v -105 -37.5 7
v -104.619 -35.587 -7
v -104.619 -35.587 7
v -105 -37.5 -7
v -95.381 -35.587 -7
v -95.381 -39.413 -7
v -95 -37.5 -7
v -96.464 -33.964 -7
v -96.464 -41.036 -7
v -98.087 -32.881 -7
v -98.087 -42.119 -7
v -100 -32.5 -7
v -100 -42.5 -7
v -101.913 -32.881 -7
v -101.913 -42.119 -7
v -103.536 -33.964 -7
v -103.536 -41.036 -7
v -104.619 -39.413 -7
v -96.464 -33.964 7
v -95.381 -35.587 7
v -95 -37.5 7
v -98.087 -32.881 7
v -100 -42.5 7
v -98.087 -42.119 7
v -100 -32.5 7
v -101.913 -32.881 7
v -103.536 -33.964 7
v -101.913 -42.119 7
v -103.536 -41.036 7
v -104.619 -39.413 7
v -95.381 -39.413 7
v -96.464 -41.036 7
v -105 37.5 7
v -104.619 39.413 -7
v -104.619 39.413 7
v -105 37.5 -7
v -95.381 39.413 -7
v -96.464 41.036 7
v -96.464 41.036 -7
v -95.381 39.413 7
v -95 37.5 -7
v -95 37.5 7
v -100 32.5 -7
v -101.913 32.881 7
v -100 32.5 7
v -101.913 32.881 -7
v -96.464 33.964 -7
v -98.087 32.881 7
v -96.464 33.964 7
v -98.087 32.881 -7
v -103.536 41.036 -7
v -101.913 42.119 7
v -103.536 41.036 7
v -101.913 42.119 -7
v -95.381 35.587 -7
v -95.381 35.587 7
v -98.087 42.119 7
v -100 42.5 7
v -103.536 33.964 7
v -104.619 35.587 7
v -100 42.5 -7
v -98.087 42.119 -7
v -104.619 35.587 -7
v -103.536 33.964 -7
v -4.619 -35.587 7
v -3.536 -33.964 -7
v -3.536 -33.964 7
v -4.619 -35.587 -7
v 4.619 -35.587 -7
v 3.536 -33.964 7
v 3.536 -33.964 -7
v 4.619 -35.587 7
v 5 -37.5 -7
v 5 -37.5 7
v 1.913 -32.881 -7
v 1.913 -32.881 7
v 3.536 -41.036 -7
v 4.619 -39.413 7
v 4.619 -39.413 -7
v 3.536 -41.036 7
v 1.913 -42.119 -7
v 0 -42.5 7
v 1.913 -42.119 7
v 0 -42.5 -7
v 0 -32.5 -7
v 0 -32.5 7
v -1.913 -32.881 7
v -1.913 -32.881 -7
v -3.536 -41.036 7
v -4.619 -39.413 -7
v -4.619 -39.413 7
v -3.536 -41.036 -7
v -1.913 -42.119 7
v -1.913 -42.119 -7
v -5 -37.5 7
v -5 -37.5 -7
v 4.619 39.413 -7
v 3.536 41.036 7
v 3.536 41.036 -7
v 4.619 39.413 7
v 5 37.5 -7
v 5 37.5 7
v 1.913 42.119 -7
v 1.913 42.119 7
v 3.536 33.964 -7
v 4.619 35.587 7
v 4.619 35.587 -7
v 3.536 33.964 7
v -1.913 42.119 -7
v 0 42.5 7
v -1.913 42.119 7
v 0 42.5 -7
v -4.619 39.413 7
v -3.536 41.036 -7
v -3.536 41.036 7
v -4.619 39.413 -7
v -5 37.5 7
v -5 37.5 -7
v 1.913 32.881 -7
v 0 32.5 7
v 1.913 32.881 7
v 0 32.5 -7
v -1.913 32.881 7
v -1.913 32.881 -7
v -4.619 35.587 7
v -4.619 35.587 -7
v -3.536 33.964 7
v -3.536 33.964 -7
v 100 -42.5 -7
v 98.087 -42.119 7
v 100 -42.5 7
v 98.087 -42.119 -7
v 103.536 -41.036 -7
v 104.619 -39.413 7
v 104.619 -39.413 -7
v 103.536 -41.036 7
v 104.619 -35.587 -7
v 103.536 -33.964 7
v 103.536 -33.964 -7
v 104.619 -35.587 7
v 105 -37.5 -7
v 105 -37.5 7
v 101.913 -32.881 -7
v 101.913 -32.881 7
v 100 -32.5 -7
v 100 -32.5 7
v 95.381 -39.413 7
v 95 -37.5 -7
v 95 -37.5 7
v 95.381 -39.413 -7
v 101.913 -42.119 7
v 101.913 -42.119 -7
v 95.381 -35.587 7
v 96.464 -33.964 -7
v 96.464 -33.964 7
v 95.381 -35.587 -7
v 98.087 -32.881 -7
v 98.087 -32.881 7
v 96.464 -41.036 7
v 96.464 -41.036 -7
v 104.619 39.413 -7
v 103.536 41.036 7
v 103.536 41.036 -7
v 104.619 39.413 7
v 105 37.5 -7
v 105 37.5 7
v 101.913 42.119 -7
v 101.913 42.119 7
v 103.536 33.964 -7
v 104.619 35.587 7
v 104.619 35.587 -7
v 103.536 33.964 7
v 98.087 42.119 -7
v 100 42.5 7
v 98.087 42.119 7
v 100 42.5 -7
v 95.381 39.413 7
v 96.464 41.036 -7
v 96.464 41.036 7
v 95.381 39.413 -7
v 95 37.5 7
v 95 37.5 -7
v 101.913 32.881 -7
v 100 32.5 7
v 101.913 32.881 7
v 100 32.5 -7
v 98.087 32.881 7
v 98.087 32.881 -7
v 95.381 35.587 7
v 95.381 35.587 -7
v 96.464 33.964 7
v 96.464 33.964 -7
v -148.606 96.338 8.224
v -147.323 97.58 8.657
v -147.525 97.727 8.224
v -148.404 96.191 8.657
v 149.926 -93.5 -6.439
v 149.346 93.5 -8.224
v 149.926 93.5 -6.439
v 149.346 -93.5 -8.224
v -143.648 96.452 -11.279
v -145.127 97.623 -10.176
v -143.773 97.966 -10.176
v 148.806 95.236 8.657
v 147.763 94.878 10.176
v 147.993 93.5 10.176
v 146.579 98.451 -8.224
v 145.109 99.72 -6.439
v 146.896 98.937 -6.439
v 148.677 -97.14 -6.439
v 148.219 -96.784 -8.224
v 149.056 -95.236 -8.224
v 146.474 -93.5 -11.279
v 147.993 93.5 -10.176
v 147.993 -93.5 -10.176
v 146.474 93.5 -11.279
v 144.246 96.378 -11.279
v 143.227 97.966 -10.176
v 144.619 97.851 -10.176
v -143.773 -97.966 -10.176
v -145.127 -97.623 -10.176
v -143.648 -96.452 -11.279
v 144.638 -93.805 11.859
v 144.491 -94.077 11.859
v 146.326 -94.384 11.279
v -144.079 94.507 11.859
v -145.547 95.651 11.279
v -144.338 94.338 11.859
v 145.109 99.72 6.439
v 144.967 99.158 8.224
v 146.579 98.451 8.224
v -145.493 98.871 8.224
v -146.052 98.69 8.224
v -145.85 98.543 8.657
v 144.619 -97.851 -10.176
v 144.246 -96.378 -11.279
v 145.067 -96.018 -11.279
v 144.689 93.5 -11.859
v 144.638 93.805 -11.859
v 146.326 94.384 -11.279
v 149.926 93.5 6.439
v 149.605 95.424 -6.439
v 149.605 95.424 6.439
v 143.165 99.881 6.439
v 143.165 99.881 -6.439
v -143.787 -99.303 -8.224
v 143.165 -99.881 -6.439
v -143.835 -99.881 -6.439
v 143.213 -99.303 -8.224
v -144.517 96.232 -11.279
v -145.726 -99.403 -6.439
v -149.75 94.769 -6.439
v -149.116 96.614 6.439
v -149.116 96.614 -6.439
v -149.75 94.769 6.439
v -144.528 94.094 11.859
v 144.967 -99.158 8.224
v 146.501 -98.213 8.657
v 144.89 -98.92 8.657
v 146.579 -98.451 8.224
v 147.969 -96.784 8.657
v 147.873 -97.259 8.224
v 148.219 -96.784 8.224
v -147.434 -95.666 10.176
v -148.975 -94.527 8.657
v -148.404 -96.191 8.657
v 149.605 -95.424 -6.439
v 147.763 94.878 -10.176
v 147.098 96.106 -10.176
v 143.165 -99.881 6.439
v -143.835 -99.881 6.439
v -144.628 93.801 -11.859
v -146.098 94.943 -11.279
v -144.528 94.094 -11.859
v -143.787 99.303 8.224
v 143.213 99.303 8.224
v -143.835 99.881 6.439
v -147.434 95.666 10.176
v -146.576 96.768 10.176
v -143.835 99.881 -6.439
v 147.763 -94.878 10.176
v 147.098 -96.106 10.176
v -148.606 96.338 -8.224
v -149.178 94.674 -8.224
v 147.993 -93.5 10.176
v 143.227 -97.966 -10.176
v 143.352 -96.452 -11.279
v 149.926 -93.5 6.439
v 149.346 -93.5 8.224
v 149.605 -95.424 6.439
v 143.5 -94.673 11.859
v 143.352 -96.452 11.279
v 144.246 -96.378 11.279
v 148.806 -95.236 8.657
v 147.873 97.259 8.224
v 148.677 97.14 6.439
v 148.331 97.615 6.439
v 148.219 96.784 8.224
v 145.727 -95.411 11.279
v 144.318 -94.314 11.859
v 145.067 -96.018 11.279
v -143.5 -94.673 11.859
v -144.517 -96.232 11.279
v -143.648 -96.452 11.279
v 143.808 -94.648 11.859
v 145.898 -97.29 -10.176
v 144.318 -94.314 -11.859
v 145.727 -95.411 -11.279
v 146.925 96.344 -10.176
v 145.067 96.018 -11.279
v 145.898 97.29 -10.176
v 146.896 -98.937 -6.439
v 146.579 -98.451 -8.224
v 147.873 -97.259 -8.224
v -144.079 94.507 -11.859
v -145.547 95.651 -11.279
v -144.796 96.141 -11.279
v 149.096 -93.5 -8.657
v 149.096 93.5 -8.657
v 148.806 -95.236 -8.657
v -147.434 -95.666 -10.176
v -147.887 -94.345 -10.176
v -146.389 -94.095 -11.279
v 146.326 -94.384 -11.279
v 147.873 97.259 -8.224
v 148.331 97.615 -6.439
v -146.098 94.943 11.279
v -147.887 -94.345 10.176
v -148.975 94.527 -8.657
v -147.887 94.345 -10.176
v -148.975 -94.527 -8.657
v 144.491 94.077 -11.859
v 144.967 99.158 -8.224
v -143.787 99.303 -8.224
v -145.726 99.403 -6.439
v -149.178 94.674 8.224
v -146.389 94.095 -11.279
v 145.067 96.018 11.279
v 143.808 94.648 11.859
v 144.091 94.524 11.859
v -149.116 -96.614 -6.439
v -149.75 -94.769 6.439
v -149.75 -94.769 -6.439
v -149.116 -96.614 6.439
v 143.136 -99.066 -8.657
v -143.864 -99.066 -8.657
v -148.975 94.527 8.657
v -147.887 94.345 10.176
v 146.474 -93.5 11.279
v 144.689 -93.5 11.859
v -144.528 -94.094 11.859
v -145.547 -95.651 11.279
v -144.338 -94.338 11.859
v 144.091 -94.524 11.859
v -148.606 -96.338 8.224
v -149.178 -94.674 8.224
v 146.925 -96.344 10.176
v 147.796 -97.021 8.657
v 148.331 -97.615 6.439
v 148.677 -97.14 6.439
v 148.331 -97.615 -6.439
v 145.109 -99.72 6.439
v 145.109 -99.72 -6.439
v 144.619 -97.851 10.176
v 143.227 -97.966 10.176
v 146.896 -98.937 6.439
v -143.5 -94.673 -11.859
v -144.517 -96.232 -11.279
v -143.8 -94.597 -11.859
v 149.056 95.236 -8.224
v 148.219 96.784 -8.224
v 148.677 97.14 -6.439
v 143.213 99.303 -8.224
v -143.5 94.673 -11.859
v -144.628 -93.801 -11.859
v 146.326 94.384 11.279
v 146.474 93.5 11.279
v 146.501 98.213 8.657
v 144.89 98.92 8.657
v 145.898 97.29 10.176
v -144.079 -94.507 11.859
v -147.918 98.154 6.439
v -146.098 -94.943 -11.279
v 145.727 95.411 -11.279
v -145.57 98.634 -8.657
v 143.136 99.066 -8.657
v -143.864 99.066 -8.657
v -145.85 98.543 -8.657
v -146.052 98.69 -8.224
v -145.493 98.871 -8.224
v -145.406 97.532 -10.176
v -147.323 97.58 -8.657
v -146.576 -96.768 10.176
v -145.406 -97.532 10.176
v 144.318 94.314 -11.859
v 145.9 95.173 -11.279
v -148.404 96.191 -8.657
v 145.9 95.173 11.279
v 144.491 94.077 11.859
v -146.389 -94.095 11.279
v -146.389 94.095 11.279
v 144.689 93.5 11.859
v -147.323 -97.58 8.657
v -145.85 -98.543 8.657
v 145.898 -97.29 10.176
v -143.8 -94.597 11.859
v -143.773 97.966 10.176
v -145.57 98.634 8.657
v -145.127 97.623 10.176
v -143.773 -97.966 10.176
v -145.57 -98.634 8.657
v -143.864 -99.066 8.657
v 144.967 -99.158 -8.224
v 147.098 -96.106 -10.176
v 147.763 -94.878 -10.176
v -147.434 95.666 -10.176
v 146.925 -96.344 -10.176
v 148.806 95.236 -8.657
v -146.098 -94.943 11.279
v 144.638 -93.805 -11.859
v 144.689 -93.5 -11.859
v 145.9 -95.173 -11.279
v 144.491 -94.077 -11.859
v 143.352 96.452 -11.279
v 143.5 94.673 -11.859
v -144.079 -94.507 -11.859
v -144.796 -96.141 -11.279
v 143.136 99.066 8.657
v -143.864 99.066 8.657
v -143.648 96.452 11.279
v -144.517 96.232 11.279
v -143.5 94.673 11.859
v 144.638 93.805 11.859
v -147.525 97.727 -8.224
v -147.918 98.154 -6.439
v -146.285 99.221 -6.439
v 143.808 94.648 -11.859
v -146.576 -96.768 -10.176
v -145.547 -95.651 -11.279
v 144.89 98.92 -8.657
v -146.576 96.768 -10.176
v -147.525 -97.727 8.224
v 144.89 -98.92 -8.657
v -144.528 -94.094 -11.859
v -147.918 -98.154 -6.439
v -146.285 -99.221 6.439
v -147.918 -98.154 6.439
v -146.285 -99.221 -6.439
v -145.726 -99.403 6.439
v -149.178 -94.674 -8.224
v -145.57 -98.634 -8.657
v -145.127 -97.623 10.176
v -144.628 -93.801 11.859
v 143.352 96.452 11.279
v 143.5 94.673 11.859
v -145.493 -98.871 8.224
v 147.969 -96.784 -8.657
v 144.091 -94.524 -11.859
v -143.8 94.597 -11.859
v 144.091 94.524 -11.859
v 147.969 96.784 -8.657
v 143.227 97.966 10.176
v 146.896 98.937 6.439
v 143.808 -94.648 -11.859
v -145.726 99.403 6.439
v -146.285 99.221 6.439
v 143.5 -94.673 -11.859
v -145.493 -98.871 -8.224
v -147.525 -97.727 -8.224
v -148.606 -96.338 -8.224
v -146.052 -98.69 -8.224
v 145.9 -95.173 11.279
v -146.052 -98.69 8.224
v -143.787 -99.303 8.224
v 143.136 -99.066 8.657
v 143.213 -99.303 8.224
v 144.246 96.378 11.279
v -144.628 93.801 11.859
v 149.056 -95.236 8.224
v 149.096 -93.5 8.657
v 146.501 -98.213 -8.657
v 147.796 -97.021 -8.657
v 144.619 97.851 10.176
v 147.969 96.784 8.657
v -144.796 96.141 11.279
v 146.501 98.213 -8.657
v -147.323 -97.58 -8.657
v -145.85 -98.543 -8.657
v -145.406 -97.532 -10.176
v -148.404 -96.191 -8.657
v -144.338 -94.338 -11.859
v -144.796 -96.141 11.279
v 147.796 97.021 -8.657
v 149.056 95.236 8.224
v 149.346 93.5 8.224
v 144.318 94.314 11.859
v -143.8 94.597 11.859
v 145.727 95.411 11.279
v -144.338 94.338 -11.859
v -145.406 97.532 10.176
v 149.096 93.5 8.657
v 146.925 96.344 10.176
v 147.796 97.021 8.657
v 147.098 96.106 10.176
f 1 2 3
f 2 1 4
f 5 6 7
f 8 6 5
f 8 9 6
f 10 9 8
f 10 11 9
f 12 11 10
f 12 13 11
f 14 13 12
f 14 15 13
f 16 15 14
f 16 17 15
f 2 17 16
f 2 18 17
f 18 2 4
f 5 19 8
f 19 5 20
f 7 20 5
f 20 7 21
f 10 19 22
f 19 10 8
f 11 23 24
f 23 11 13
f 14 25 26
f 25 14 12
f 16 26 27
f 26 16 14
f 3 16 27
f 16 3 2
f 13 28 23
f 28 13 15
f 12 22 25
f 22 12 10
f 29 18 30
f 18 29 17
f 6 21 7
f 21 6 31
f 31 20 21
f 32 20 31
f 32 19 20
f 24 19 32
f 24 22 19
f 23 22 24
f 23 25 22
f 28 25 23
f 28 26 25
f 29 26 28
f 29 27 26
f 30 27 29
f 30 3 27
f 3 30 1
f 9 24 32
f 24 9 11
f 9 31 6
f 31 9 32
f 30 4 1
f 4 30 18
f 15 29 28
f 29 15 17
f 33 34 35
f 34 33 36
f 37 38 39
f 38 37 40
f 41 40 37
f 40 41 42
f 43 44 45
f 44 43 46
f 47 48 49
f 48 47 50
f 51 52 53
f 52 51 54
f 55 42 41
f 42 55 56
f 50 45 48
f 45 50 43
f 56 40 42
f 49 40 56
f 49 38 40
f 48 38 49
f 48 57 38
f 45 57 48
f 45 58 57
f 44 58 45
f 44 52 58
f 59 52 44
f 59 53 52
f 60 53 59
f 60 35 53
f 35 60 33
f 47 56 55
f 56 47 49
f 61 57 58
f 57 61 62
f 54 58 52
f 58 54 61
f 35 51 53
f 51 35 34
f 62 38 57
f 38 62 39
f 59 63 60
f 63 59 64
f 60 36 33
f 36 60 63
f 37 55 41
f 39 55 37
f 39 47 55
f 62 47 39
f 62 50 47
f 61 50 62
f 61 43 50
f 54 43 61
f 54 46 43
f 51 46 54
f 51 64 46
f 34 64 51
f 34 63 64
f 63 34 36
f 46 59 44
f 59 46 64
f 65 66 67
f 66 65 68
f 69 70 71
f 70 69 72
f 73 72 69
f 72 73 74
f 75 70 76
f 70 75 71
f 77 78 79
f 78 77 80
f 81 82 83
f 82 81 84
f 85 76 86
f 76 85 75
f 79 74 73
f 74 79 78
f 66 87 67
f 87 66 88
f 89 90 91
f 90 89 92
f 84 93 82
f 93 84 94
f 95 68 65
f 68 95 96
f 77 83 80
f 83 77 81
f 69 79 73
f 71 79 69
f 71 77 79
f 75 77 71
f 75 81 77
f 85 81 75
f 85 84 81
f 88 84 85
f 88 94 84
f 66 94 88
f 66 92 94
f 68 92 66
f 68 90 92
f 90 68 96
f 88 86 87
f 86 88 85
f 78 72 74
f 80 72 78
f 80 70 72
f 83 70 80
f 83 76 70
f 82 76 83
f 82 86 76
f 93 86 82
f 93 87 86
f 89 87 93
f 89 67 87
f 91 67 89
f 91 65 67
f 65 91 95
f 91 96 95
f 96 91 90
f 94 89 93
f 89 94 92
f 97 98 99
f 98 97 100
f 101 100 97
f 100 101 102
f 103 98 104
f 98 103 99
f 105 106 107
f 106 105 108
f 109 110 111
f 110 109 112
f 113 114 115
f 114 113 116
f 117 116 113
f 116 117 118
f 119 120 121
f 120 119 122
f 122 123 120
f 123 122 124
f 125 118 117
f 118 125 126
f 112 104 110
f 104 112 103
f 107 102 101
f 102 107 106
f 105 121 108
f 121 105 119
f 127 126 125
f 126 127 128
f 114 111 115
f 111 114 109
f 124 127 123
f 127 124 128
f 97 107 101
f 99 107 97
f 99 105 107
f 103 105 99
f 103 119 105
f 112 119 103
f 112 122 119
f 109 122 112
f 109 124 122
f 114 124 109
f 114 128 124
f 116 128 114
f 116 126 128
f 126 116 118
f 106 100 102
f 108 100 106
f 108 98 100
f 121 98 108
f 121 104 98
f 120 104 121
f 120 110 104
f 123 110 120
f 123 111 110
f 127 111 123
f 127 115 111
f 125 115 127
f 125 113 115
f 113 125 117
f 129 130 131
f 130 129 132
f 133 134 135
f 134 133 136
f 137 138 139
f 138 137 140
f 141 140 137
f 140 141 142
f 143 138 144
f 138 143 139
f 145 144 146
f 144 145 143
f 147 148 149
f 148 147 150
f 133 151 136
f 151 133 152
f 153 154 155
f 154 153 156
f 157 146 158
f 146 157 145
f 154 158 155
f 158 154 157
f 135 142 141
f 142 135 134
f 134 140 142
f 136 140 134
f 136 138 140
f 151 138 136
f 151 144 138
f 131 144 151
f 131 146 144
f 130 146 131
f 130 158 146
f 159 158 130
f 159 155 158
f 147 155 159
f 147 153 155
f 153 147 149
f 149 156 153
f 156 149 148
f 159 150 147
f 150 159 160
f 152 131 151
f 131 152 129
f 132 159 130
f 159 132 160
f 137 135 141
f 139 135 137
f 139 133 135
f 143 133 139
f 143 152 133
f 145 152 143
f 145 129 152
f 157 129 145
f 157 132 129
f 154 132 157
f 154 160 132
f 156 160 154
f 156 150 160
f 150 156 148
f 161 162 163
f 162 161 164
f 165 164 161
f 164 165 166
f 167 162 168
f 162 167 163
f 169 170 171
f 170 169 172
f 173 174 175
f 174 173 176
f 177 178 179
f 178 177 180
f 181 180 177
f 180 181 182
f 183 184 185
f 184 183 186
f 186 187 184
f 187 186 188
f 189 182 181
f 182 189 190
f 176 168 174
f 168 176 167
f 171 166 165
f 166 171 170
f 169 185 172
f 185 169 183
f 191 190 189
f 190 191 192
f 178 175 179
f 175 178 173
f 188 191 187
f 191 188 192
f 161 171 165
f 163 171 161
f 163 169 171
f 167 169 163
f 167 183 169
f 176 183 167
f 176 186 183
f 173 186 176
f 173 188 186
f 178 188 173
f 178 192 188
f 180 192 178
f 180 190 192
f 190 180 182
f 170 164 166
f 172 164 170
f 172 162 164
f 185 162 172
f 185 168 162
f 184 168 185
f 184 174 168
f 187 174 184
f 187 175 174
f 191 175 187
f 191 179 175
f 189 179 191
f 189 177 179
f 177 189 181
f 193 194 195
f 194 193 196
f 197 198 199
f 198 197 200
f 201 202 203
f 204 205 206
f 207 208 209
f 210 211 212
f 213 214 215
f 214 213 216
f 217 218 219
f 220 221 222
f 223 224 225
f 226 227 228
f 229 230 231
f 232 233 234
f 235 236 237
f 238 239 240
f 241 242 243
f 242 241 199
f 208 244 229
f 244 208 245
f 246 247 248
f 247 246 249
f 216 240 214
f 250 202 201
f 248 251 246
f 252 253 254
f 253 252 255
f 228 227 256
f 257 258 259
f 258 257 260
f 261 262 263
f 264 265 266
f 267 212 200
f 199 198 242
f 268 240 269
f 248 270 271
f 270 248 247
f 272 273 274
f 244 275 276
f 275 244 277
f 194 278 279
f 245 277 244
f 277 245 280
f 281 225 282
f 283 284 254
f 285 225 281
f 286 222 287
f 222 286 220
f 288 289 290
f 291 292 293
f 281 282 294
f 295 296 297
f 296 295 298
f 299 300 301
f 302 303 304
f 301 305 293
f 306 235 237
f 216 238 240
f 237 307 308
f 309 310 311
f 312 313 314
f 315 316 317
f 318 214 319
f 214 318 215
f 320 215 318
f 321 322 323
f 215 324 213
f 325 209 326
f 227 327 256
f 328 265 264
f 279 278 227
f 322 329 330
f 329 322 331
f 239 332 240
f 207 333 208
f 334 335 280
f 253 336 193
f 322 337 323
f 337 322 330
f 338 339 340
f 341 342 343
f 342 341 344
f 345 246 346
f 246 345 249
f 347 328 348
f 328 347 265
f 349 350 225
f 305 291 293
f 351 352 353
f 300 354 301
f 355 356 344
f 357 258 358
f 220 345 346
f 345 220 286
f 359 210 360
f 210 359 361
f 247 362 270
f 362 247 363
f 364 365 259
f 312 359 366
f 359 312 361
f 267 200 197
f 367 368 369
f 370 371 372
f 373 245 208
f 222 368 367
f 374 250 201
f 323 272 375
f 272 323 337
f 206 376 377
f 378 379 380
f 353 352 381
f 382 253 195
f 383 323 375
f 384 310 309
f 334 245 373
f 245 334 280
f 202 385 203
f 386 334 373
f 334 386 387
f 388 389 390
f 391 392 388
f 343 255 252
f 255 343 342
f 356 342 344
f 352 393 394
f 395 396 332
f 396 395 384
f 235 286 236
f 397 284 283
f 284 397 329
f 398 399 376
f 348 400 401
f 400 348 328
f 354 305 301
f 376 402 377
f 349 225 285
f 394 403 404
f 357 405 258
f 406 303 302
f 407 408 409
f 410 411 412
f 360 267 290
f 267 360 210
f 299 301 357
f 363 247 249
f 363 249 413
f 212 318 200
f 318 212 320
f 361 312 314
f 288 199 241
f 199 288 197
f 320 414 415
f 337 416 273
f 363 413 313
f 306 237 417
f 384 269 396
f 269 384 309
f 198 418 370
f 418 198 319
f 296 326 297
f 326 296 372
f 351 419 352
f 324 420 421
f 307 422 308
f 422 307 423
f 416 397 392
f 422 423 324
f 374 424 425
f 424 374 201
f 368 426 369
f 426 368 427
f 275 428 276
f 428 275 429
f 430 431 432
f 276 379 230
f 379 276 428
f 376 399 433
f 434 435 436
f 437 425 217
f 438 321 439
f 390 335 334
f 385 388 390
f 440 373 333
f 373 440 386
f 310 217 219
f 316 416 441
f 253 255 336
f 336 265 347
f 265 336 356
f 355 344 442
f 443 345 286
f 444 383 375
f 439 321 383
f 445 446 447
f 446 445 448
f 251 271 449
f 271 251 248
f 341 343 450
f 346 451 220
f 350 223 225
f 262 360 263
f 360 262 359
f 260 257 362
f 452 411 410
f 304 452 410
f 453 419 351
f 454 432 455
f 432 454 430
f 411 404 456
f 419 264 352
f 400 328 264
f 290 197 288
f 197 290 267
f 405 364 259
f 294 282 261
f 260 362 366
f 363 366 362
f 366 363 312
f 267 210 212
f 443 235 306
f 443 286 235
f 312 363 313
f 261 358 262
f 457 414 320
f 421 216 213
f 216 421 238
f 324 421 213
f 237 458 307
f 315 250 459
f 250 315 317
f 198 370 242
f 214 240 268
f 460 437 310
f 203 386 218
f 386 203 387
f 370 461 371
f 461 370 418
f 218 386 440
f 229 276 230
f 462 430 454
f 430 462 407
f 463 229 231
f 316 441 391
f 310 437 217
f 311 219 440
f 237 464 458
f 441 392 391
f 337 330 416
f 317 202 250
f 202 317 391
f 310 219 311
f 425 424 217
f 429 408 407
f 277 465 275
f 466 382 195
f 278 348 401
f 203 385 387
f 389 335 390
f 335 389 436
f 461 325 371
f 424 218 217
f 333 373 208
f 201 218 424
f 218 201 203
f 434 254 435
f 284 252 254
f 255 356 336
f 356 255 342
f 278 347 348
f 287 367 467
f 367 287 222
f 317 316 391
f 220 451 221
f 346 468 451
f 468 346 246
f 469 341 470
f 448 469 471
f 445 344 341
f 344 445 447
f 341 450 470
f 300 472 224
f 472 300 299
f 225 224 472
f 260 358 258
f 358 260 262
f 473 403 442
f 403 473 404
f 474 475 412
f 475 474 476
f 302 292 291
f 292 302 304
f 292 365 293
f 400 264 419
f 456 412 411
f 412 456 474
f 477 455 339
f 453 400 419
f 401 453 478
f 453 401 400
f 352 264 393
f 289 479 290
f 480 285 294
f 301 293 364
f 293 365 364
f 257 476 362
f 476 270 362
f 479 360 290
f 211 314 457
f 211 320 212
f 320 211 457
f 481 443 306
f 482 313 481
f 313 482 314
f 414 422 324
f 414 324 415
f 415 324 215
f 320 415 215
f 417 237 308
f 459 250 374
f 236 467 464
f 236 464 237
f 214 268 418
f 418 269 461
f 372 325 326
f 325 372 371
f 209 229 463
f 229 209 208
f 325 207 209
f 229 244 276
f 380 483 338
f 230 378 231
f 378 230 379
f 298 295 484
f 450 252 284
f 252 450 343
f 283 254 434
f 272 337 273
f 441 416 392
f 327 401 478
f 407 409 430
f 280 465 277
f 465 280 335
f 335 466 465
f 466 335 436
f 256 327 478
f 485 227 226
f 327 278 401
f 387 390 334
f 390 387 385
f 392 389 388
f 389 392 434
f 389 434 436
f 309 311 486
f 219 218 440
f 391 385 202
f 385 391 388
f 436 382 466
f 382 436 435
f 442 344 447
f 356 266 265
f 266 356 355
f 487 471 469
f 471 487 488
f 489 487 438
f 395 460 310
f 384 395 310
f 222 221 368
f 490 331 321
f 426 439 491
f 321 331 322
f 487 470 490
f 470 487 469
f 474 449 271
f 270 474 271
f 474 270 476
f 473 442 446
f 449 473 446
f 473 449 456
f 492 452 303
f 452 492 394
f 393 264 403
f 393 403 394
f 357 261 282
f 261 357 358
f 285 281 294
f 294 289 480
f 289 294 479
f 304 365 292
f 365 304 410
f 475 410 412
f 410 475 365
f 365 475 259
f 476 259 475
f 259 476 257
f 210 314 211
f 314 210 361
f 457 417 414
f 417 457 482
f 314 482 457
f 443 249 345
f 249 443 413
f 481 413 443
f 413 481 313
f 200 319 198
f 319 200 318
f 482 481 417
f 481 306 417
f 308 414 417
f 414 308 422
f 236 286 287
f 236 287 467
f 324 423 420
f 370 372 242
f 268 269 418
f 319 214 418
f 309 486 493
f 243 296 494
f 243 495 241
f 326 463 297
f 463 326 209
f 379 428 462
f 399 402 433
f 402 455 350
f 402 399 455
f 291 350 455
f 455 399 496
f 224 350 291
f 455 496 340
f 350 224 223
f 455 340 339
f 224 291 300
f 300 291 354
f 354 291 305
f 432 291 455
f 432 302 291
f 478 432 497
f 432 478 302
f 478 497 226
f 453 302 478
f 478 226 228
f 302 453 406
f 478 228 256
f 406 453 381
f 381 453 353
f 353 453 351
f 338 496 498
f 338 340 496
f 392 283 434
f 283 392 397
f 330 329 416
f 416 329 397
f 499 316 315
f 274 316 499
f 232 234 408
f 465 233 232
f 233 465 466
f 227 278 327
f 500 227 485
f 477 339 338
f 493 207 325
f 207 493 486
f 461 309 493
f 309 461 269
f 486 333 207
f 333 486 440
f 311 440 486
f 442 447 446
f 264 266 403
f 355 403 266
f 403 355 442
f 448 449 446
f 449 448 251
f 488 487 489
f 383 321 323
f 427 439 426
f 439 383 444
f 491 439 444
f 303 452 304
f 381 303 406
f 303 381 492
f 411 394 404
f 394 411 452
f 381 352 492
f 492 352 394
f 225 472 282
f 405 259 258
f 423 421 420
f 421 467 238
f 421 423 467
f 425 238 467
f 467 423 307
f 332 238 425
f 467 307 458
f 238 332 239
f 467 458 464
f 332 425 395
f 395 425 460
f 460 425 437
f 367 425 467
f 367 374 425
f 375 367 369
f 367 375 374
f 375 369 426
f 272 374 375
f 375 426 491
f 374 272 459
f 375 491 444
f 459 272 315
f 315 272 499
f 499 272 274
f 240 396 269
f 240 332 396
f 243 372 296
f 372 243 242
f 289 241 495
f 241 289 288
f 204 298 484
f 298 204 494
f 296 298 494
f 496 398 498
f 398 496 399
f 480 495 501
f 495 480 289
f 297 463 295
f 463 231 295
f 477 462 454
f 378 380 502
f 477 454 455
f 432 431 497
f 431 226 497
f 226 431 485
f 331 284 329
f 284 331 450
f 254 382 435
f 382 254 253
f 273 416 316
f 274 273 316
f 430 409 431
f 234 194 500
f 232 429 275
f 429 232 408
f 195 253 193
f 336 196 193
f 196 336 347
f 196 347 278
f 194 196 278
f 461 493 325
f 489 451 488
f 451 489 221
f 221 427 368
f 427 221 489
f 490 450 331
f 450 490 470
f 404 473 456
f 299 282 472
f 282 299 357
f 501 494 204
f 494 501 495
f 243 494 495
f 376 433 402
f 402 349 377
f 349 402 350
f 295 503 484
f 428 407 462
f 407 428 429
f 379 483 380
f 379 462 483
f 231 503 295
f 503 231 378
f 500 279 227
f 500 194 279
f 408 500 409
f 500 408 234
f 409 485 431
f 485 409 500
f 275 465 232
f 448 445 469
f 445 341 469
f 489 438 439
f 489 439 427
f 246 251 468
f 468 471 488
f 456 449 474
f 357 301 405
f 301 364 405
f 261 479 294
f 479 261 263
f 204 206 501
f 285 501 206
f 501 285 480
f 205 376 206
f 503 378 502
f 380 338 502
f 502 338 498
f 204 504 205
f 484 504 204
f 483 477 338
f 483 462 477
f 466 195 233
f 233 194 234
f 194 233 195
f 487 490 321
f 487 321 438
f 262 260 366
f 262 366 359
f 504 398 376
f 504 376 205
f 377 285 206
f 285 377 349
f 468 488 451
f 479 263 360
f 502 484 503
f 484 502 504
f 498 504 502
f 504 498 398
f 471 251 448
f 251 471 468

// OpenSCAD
// Parameters
plate_L = 300; //[150:600:1]
plate_W = 200; //[100:400:1]
plate_T = 12; //[6:24:1]
edge_chamfer = 0.5; //[0.25:2:0.25]
corner_radius = 6; //[3:20:1]
hole_d = 10; //[4:20:1]
hole_edge_offset = 25; //[10:60:1]
hole_pitch_x = 100; //[50:200:1]
hole_pitch_y = 75; //[40:150:1]
hole_count_x = 3; //[2:6:1]
hole_count_y = 2; //[2:6:1]
hole_clearance_z = 2; //[1:5:0.5]

// Base shapes
module tooling_plate_body() {
  cube([plate_L - 2*(corner_radius + edge_chamfer), 
        plate_W - 2*(corner_radius + edge_chamfer), 
        plate_T - 2*edge_chamfer], center=true);
}

module corner_radius_sphere() {
  sphere(r=corner_radius, center=true);
}

module edge_chamfer_sphere() {
  sphere(r=edge_chamfer, center=true);
}

module mounting_hole_cutter() {
  cylinder(h=plate_T + hole_clearance_z, r=hole_d/2, center=true);
}

module engraved_label() {
  cube([plate_L/5, plate_W/6, plate_T/20], center=true);
}

// Operations
module corner_radius() {
  minkowski() {
    tooling_plate_body();
    corner_radius_sphere();
  }
}

module edge_chamfer_or_radius() {
  minkowski() {
    corner_radius();
    edge_chamfer_sphere();
  }
}

module mounting_holes_pattern() {
  union() {
    for (i = [0:hole_count_x-1]) {
      for (j = [0:hole_count_y-1]) {
        translate([-(hole_pitch_x*(hole_count_x-1))/2 + i*hole_pitch_x, 
                   -(hole_pitch_y*(hole_count_y-1))/2 + j*hole_pitch_y, 
                   0]) 
        mounting_hole_cutter();
      }
    }
  }
}

module plate_with_holes() {
  difference() {
    edge_chamfer_or_radius();
    mounting_holes_pattern();
  }
}

module final_model() {
  union() {
    plate_with_holes();
    translate([0, 0, plate_T/2 - (plate_T/20)/2]) engraved_label();
  }
}

// Render the final model
color("Silver") final_model();
